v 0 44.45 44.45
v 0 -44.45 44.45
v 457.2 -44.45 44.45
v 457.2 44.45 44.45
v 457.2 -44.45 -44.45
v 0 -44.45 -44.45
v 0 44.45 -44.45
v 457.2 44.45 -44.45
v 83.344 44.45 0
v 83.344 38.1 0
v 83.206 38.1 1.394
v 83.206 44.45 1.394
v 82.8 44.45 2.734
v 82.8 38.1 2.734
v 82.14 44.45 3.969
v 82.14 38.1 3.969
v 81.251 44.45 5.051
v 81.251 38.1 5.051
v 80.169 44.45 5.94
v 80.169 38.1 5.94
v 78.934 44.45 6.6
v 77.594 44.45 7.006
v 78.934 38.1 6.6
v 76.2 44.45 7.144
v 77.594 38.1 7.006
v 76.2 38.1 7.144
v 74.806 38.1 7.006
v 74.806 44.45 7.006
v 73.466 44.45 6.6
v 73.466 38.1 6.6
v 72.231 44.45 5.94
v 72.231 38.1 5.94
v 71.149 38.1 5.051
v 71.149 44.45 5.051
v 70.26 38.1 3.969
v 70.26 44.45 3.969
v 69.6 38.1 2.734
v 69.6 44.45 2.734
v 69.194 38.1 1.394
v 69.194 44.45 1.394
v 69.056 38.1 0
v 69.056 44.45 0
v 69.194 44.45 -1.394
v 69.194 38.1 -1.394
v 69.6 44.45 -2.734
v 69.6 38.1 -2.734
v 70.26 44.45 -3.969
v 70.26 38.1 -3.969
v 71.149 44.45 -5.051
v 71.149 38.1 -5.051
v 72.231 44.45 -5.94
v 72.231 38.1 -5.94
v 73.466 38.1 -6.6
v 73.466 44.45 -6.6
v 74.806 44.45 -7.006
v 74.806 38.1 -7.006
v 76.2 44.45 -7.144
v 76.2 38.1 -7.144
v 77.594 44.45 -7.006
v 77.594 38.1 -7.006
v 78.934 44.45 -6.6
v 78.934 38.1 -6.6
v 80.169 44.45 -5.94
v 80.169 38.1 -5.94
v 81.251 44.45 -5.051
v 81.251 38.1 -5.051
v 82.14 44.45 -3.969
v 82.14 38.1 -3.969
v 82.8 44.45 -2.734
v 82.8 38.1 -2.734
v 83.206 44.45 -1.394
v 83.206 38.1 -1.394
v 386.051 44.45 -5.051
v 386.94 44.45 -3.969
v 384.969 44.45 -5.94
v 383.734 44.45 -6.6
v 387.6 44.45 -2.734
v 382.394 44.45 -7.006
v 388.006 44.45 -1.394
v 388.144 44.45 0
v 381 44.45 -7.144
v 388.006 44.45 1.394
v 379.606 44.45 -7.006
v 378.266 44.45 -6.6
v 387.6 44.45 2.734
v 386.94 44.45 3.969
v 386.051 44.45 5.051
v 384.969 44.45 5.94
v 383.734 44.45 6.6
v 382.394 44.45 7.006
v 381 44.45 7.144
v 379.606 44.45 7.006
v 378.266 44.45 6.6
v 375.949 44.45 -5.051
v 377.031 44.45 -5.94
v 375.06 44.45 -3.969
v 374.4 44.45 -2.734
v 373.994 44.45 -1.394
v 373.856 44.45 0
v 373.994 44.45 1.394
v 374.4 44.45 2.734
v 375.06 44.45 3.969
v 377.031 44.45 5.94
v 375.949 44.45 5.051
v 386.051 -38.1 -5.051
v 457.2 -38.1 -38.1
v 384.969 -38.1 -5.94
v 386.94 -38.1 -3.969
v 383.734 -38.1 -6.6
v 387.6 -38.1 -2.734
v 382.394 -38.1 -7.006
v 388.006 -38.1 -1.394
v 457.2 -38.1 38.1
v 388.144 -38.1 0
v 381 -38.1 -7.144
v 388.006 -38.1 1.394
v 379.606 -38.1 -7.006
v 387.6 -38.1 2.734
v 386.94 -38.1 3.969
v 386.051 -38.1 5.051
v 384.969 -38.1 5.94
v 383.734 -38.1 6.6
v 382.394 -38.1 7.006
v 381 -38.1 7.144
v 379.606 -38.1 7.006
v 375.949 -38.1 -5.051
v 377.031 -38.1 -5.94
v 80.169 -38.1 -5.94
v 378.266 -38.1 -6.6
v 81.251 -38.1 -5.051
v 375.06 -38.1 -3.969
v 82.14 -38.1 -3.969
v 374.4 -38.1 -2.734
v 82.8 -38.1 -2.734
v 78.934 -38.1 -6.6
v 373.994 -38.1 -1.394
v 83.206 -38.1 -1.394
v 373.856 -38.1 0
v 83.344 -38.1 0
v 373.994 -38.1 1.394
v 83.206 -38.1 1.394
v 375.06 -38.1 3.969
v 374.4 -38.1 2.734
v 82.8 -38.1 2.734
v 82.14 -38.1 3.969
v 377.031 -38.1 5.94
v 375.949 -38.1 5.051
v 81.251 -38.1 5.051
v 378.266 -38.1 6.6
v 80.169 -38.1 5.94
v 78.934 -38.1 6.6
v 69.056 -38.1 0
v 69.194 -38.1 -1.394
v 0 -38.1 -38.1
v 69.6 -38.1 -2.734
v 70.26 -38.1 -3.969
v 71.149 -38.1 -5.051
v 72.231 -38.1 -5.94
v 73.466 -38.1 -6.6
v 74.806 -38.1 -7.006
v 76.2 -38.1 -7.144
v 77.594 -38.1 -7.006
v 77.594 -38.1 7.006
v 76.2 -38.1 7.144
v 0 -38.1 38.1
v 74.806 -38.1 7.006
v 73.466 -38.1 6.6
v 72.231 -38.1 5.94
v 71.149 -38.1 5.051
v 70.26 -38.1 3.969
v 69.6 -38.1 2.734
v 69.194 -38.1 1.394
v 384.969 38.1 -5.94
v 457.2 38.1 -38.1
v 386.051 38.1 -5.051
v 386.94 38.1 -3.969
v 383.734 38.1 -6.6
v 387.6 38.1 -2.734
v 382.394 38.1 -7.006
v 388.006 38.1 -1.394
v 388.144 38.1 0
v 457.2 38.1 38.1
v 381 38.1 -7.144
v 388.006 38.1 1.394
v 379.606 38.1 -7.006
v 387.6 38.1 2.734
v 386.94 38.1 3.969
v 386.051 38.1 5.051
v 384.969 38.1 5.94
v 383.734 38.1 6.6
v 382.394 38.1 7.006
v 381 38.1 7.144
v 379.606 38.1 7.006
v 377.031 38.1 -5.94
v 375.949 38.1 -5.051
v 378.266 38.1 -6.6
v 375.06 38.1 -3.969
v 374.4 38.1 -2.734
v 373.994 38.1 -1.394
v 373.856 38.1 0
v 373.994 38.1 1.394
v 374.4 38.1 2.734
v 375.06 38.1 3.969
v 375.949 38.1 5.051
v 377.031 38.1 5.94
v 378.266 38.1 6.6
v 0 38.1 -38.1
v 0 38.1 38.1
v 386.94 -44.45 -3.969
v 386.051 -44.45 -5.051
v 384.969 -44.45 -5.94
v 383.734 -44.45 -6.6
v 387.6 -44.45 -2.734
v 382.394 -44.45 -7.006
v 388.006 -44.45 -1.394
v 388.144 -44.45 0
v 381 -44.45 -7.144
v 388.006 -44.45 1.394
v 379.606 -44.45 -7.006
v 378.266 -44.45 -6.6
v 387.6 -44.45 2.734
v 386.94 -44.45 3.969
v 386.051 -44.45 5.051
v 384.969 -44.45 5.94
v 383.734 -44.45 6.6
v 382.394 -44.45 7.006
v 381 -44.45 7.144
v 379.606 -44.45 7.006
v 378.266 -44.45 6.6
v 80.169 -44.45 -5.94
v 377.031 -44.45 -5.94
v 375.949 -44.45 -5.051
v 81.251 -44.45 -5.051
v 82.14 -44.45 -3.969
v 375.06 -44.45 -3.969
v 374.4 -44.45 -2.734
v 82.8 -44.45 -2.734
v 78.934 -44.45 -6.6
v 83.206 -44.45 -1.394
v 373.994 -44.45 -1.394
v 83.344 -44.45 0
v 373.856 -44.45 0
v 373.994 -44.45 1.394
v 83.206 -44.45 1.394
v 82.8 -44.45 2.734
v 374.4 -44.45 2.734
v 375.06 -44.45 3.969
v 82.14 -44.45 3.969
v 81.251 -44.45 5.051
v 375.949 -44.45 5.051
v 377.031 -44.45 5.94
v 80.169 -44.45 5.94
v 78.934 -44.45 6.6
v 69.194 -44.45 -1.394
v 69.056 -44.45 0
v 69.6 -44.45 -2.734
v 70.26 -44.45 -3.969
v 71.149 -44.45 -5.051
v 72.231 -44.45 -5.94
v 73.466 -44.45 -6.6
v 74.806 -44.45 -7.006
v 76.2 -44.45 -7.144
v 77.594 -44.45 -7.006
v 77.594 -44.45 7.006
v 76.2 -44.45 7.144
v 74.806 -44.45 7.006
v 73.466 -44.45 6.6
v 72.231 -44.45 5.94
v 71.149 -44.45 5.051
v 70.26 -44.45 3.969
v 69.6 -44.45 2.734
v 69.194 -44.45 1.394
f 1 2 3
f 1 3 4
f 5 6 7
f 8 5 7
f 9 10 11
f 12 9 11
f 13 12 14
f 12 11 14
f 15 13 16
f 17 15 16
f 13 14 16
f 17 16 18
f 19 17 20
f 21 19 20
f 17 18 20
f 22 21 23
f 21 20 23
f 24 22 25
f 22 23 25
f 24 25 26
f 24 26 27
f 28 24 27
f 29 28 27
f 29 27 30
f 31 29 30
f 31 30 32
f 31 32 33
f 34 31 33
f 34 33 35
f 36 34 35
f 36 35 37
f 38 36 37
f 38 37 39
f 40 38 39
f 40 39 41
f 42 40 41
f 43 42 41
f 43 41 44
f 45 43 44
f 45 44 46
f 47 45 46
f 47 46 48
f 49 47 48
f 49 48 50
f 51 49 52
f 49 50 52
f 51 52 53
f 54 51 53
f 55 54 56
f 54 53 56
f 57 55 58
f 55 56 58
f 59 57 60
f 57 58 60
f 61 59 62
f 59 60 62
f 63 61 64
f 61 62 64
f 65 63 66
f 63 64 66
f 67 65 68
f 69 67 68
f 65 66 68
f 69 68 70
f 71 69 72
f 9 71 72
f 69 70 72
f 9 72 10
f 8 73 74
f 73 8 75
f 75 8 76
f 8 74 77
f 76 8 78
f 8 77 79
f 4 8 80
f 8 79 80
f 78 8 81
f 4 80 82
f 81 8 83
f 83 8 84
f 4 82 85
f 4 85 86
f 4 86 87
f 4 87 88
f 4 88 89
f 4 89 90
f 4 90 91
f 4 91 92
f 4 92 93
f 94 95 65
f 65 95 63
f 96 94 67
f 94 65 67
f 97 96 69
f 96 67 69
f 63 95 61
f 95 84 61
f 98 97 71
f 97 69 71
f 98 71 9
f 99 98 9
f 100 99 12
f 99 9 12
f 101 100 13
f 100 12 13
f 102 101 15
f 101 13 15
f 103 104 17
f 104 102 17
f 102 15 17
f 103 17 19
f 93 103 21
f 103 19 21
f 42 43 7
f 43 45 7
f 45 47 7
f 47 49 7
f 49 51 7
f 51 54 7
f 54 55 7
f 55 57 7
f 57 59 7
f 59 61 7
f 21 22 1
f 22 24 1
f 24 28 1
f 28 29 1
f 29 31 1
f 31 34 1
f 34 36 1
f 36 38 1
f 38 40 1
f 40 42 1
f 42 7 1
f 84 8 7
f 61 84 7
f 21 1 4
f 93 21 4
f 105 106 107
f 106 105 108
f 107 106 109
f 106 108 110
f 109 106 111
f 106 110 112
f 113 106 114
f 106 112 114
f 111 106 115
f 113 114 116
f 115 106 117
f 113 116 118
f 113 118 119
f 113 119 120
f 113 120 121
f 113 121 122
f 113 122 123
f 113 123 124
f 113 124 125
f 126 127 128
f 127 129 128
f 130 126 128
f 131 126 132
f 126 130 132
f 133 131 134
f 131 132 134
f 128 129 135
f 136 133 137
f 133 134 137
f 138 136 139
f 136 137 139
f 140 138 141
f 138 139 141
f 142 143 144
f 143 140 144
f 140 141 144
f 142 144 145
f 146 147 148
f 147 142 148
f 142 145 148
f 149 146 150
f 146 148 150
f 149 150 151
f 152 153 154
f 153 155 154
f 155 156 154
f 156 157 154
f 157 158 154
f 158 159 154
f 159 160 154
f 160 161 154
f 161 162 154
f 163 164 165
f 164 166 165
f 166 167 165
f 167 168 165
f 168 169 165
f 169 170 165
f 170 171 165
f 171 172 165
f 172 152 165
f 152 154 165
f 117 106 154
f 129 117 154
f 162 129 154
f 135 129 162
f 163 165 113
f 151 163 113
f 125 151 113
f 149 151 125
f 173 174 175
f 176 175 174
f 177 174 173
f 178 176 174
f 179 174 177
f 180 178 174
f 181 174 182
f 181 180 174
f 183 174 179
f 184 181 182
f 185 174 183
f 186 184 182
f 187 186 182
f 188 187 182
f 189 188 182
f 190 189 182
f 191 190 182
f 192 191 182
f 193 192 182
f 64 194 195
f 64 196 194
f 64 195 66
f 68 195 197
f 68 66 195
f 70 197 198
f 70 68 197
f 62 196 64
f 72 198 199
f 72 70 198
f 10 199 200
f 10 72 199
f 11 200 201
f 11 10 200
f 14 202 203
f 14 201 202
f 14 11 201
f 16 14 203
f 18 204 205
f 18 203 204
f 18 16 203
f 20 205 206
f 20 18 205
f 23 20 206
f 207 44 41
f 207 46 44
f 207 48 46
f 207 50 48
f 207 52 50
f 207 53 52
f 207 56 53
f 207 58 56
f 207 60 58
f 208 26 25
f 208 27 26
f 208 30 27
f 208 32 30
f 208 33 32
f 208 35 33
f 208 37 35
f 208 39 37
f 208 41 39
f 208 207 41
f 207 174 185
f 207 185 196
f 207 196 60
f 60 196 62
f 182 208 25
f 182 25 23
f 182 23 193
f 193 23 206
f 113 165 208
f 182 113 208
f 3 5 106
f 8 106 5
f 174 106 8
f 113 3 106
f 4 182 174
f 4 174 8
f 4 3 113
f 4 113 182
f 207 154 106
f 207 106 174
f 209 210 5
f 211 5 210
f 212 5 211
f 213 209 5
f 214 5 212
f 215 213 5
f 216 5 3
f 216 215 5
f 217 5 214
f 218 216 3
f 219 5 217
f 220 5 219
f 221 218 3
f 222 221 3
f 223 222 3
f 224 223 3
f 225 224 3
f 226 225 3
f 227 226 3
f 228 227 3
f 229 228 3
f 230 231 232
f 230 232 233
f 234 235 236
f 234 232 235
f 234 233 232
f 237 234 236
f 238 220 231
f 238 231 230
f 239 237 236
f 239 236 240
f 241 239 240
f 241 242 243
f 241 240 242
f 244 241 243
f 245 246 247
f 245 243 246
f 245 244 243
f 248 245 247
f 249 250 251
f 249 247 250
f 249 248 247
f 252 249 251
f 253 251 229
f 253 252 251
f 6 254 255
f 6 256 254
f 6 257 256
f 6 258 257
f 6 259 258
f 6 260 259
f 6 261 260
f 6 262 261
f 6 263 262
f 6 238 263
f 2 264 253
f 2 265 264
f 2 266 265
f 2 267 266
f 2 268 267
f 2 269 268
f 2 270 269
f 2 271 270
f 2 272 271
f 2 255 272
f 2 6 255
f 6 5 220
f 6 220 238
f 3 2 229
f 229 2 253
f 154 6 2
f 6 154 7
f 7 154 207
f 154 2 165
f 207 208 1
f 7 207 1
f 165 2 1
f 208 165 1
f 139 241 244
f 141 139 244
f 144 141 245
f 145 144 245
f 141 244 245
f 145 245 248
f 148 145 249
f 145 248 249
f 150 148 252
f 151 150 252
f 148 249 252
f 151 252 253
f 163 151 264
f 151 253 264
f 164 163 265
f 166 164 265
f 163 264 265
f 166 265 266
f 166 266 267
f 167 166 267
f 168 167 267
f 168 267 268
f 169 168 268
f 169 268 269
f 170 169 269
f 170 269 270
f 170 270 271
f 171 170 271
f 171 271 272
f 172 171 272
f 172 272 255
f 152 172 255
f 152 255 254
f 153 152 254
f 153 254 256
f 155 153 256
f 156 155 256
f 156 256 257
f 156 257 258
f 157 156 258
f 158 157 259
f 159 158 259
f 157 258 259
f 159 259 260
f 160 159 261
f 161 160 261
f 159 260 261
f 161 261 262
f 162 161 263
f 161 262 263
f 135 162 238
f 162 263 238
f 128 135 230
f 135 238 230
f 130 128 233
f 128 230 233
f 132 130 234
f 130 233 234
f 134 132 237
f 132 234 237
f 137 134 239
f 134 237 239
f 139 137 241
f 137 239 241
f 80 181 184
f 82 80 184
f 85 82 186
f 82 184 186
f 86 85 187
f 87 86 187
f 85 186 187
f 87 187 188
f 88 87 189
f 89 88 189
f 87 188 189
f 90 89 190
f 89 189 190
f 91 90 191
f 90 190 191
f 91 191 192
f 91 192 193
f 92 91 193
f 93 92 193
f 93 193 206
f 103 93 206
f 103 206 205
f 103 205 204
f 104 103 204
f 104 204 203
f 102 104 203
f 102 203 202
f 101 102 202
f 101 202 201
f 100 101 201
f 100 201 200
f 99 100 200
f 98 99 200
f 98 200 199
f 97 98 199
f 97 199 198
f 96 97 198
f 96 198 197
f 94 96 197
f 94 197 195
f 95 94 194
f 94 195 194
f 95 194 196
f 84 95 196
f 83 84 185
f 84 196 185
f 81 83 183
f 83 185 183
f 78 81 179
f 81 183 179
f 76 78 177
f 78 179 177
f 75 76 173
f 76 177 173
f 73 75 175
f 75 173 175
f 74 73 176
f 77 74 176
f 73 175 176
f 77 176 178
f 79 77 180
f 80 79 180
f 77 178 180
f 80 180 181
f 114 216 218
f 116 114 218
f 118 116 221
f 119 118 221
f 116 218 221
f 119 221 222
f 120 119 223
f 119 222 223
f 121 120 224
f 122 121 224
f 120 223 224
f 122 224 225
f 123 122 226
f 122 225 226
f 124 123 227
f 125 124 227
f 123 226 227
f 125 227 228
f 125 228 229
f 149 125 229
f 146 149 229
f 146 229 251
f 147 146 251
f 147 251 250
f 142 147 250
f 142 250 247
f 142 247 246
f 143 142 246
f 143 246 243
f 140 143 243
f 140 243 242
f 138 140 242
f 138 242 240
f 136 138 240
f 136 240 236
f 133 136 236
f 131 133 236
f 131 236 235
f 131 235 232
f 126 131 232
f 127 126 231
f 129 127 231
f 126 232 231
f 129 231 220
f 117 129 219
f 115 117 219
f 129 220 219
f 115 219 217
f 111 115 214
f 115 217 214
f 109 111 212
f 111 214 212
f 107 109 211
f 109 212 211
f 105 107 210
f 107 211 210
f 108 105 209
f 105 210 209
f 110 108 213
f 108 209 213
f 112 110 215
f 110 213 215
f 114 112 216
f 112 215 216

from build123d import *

# Parameters (mm, degrees)
F0_W     = 88.9
F0_H     = 88.9
F0_W_2   = 76.2
F0_H_2   = 76.2
F1_DEPTH = 457.2
F2_R     = 7.14375
F3_DEPTH = 88.901


with BuildPart() as f1:
    # F0 (on Right) → F1 (new body)
    with BuildSketch(Plane.YZ):
        Rectangle(F0_W, F0_H)
        Rectangle(F0_W_2, F0_H_2, mode=Mode.SUBTRACT)
    extrude(amount=F1_DEPTH)

    # F2 (on face) → F3 (cut, through all)
    with BuildSketch(Plane.XZ.offset(44.45)):
        with Locations((381, 0)):
            Circle(F2_R)
        with Locations((76.2, 0)):
            Circle(F2_R)
    extrude(amount=-F3_DEPTH, mode=Mode.SUBTRACT)


solid = f1.part
